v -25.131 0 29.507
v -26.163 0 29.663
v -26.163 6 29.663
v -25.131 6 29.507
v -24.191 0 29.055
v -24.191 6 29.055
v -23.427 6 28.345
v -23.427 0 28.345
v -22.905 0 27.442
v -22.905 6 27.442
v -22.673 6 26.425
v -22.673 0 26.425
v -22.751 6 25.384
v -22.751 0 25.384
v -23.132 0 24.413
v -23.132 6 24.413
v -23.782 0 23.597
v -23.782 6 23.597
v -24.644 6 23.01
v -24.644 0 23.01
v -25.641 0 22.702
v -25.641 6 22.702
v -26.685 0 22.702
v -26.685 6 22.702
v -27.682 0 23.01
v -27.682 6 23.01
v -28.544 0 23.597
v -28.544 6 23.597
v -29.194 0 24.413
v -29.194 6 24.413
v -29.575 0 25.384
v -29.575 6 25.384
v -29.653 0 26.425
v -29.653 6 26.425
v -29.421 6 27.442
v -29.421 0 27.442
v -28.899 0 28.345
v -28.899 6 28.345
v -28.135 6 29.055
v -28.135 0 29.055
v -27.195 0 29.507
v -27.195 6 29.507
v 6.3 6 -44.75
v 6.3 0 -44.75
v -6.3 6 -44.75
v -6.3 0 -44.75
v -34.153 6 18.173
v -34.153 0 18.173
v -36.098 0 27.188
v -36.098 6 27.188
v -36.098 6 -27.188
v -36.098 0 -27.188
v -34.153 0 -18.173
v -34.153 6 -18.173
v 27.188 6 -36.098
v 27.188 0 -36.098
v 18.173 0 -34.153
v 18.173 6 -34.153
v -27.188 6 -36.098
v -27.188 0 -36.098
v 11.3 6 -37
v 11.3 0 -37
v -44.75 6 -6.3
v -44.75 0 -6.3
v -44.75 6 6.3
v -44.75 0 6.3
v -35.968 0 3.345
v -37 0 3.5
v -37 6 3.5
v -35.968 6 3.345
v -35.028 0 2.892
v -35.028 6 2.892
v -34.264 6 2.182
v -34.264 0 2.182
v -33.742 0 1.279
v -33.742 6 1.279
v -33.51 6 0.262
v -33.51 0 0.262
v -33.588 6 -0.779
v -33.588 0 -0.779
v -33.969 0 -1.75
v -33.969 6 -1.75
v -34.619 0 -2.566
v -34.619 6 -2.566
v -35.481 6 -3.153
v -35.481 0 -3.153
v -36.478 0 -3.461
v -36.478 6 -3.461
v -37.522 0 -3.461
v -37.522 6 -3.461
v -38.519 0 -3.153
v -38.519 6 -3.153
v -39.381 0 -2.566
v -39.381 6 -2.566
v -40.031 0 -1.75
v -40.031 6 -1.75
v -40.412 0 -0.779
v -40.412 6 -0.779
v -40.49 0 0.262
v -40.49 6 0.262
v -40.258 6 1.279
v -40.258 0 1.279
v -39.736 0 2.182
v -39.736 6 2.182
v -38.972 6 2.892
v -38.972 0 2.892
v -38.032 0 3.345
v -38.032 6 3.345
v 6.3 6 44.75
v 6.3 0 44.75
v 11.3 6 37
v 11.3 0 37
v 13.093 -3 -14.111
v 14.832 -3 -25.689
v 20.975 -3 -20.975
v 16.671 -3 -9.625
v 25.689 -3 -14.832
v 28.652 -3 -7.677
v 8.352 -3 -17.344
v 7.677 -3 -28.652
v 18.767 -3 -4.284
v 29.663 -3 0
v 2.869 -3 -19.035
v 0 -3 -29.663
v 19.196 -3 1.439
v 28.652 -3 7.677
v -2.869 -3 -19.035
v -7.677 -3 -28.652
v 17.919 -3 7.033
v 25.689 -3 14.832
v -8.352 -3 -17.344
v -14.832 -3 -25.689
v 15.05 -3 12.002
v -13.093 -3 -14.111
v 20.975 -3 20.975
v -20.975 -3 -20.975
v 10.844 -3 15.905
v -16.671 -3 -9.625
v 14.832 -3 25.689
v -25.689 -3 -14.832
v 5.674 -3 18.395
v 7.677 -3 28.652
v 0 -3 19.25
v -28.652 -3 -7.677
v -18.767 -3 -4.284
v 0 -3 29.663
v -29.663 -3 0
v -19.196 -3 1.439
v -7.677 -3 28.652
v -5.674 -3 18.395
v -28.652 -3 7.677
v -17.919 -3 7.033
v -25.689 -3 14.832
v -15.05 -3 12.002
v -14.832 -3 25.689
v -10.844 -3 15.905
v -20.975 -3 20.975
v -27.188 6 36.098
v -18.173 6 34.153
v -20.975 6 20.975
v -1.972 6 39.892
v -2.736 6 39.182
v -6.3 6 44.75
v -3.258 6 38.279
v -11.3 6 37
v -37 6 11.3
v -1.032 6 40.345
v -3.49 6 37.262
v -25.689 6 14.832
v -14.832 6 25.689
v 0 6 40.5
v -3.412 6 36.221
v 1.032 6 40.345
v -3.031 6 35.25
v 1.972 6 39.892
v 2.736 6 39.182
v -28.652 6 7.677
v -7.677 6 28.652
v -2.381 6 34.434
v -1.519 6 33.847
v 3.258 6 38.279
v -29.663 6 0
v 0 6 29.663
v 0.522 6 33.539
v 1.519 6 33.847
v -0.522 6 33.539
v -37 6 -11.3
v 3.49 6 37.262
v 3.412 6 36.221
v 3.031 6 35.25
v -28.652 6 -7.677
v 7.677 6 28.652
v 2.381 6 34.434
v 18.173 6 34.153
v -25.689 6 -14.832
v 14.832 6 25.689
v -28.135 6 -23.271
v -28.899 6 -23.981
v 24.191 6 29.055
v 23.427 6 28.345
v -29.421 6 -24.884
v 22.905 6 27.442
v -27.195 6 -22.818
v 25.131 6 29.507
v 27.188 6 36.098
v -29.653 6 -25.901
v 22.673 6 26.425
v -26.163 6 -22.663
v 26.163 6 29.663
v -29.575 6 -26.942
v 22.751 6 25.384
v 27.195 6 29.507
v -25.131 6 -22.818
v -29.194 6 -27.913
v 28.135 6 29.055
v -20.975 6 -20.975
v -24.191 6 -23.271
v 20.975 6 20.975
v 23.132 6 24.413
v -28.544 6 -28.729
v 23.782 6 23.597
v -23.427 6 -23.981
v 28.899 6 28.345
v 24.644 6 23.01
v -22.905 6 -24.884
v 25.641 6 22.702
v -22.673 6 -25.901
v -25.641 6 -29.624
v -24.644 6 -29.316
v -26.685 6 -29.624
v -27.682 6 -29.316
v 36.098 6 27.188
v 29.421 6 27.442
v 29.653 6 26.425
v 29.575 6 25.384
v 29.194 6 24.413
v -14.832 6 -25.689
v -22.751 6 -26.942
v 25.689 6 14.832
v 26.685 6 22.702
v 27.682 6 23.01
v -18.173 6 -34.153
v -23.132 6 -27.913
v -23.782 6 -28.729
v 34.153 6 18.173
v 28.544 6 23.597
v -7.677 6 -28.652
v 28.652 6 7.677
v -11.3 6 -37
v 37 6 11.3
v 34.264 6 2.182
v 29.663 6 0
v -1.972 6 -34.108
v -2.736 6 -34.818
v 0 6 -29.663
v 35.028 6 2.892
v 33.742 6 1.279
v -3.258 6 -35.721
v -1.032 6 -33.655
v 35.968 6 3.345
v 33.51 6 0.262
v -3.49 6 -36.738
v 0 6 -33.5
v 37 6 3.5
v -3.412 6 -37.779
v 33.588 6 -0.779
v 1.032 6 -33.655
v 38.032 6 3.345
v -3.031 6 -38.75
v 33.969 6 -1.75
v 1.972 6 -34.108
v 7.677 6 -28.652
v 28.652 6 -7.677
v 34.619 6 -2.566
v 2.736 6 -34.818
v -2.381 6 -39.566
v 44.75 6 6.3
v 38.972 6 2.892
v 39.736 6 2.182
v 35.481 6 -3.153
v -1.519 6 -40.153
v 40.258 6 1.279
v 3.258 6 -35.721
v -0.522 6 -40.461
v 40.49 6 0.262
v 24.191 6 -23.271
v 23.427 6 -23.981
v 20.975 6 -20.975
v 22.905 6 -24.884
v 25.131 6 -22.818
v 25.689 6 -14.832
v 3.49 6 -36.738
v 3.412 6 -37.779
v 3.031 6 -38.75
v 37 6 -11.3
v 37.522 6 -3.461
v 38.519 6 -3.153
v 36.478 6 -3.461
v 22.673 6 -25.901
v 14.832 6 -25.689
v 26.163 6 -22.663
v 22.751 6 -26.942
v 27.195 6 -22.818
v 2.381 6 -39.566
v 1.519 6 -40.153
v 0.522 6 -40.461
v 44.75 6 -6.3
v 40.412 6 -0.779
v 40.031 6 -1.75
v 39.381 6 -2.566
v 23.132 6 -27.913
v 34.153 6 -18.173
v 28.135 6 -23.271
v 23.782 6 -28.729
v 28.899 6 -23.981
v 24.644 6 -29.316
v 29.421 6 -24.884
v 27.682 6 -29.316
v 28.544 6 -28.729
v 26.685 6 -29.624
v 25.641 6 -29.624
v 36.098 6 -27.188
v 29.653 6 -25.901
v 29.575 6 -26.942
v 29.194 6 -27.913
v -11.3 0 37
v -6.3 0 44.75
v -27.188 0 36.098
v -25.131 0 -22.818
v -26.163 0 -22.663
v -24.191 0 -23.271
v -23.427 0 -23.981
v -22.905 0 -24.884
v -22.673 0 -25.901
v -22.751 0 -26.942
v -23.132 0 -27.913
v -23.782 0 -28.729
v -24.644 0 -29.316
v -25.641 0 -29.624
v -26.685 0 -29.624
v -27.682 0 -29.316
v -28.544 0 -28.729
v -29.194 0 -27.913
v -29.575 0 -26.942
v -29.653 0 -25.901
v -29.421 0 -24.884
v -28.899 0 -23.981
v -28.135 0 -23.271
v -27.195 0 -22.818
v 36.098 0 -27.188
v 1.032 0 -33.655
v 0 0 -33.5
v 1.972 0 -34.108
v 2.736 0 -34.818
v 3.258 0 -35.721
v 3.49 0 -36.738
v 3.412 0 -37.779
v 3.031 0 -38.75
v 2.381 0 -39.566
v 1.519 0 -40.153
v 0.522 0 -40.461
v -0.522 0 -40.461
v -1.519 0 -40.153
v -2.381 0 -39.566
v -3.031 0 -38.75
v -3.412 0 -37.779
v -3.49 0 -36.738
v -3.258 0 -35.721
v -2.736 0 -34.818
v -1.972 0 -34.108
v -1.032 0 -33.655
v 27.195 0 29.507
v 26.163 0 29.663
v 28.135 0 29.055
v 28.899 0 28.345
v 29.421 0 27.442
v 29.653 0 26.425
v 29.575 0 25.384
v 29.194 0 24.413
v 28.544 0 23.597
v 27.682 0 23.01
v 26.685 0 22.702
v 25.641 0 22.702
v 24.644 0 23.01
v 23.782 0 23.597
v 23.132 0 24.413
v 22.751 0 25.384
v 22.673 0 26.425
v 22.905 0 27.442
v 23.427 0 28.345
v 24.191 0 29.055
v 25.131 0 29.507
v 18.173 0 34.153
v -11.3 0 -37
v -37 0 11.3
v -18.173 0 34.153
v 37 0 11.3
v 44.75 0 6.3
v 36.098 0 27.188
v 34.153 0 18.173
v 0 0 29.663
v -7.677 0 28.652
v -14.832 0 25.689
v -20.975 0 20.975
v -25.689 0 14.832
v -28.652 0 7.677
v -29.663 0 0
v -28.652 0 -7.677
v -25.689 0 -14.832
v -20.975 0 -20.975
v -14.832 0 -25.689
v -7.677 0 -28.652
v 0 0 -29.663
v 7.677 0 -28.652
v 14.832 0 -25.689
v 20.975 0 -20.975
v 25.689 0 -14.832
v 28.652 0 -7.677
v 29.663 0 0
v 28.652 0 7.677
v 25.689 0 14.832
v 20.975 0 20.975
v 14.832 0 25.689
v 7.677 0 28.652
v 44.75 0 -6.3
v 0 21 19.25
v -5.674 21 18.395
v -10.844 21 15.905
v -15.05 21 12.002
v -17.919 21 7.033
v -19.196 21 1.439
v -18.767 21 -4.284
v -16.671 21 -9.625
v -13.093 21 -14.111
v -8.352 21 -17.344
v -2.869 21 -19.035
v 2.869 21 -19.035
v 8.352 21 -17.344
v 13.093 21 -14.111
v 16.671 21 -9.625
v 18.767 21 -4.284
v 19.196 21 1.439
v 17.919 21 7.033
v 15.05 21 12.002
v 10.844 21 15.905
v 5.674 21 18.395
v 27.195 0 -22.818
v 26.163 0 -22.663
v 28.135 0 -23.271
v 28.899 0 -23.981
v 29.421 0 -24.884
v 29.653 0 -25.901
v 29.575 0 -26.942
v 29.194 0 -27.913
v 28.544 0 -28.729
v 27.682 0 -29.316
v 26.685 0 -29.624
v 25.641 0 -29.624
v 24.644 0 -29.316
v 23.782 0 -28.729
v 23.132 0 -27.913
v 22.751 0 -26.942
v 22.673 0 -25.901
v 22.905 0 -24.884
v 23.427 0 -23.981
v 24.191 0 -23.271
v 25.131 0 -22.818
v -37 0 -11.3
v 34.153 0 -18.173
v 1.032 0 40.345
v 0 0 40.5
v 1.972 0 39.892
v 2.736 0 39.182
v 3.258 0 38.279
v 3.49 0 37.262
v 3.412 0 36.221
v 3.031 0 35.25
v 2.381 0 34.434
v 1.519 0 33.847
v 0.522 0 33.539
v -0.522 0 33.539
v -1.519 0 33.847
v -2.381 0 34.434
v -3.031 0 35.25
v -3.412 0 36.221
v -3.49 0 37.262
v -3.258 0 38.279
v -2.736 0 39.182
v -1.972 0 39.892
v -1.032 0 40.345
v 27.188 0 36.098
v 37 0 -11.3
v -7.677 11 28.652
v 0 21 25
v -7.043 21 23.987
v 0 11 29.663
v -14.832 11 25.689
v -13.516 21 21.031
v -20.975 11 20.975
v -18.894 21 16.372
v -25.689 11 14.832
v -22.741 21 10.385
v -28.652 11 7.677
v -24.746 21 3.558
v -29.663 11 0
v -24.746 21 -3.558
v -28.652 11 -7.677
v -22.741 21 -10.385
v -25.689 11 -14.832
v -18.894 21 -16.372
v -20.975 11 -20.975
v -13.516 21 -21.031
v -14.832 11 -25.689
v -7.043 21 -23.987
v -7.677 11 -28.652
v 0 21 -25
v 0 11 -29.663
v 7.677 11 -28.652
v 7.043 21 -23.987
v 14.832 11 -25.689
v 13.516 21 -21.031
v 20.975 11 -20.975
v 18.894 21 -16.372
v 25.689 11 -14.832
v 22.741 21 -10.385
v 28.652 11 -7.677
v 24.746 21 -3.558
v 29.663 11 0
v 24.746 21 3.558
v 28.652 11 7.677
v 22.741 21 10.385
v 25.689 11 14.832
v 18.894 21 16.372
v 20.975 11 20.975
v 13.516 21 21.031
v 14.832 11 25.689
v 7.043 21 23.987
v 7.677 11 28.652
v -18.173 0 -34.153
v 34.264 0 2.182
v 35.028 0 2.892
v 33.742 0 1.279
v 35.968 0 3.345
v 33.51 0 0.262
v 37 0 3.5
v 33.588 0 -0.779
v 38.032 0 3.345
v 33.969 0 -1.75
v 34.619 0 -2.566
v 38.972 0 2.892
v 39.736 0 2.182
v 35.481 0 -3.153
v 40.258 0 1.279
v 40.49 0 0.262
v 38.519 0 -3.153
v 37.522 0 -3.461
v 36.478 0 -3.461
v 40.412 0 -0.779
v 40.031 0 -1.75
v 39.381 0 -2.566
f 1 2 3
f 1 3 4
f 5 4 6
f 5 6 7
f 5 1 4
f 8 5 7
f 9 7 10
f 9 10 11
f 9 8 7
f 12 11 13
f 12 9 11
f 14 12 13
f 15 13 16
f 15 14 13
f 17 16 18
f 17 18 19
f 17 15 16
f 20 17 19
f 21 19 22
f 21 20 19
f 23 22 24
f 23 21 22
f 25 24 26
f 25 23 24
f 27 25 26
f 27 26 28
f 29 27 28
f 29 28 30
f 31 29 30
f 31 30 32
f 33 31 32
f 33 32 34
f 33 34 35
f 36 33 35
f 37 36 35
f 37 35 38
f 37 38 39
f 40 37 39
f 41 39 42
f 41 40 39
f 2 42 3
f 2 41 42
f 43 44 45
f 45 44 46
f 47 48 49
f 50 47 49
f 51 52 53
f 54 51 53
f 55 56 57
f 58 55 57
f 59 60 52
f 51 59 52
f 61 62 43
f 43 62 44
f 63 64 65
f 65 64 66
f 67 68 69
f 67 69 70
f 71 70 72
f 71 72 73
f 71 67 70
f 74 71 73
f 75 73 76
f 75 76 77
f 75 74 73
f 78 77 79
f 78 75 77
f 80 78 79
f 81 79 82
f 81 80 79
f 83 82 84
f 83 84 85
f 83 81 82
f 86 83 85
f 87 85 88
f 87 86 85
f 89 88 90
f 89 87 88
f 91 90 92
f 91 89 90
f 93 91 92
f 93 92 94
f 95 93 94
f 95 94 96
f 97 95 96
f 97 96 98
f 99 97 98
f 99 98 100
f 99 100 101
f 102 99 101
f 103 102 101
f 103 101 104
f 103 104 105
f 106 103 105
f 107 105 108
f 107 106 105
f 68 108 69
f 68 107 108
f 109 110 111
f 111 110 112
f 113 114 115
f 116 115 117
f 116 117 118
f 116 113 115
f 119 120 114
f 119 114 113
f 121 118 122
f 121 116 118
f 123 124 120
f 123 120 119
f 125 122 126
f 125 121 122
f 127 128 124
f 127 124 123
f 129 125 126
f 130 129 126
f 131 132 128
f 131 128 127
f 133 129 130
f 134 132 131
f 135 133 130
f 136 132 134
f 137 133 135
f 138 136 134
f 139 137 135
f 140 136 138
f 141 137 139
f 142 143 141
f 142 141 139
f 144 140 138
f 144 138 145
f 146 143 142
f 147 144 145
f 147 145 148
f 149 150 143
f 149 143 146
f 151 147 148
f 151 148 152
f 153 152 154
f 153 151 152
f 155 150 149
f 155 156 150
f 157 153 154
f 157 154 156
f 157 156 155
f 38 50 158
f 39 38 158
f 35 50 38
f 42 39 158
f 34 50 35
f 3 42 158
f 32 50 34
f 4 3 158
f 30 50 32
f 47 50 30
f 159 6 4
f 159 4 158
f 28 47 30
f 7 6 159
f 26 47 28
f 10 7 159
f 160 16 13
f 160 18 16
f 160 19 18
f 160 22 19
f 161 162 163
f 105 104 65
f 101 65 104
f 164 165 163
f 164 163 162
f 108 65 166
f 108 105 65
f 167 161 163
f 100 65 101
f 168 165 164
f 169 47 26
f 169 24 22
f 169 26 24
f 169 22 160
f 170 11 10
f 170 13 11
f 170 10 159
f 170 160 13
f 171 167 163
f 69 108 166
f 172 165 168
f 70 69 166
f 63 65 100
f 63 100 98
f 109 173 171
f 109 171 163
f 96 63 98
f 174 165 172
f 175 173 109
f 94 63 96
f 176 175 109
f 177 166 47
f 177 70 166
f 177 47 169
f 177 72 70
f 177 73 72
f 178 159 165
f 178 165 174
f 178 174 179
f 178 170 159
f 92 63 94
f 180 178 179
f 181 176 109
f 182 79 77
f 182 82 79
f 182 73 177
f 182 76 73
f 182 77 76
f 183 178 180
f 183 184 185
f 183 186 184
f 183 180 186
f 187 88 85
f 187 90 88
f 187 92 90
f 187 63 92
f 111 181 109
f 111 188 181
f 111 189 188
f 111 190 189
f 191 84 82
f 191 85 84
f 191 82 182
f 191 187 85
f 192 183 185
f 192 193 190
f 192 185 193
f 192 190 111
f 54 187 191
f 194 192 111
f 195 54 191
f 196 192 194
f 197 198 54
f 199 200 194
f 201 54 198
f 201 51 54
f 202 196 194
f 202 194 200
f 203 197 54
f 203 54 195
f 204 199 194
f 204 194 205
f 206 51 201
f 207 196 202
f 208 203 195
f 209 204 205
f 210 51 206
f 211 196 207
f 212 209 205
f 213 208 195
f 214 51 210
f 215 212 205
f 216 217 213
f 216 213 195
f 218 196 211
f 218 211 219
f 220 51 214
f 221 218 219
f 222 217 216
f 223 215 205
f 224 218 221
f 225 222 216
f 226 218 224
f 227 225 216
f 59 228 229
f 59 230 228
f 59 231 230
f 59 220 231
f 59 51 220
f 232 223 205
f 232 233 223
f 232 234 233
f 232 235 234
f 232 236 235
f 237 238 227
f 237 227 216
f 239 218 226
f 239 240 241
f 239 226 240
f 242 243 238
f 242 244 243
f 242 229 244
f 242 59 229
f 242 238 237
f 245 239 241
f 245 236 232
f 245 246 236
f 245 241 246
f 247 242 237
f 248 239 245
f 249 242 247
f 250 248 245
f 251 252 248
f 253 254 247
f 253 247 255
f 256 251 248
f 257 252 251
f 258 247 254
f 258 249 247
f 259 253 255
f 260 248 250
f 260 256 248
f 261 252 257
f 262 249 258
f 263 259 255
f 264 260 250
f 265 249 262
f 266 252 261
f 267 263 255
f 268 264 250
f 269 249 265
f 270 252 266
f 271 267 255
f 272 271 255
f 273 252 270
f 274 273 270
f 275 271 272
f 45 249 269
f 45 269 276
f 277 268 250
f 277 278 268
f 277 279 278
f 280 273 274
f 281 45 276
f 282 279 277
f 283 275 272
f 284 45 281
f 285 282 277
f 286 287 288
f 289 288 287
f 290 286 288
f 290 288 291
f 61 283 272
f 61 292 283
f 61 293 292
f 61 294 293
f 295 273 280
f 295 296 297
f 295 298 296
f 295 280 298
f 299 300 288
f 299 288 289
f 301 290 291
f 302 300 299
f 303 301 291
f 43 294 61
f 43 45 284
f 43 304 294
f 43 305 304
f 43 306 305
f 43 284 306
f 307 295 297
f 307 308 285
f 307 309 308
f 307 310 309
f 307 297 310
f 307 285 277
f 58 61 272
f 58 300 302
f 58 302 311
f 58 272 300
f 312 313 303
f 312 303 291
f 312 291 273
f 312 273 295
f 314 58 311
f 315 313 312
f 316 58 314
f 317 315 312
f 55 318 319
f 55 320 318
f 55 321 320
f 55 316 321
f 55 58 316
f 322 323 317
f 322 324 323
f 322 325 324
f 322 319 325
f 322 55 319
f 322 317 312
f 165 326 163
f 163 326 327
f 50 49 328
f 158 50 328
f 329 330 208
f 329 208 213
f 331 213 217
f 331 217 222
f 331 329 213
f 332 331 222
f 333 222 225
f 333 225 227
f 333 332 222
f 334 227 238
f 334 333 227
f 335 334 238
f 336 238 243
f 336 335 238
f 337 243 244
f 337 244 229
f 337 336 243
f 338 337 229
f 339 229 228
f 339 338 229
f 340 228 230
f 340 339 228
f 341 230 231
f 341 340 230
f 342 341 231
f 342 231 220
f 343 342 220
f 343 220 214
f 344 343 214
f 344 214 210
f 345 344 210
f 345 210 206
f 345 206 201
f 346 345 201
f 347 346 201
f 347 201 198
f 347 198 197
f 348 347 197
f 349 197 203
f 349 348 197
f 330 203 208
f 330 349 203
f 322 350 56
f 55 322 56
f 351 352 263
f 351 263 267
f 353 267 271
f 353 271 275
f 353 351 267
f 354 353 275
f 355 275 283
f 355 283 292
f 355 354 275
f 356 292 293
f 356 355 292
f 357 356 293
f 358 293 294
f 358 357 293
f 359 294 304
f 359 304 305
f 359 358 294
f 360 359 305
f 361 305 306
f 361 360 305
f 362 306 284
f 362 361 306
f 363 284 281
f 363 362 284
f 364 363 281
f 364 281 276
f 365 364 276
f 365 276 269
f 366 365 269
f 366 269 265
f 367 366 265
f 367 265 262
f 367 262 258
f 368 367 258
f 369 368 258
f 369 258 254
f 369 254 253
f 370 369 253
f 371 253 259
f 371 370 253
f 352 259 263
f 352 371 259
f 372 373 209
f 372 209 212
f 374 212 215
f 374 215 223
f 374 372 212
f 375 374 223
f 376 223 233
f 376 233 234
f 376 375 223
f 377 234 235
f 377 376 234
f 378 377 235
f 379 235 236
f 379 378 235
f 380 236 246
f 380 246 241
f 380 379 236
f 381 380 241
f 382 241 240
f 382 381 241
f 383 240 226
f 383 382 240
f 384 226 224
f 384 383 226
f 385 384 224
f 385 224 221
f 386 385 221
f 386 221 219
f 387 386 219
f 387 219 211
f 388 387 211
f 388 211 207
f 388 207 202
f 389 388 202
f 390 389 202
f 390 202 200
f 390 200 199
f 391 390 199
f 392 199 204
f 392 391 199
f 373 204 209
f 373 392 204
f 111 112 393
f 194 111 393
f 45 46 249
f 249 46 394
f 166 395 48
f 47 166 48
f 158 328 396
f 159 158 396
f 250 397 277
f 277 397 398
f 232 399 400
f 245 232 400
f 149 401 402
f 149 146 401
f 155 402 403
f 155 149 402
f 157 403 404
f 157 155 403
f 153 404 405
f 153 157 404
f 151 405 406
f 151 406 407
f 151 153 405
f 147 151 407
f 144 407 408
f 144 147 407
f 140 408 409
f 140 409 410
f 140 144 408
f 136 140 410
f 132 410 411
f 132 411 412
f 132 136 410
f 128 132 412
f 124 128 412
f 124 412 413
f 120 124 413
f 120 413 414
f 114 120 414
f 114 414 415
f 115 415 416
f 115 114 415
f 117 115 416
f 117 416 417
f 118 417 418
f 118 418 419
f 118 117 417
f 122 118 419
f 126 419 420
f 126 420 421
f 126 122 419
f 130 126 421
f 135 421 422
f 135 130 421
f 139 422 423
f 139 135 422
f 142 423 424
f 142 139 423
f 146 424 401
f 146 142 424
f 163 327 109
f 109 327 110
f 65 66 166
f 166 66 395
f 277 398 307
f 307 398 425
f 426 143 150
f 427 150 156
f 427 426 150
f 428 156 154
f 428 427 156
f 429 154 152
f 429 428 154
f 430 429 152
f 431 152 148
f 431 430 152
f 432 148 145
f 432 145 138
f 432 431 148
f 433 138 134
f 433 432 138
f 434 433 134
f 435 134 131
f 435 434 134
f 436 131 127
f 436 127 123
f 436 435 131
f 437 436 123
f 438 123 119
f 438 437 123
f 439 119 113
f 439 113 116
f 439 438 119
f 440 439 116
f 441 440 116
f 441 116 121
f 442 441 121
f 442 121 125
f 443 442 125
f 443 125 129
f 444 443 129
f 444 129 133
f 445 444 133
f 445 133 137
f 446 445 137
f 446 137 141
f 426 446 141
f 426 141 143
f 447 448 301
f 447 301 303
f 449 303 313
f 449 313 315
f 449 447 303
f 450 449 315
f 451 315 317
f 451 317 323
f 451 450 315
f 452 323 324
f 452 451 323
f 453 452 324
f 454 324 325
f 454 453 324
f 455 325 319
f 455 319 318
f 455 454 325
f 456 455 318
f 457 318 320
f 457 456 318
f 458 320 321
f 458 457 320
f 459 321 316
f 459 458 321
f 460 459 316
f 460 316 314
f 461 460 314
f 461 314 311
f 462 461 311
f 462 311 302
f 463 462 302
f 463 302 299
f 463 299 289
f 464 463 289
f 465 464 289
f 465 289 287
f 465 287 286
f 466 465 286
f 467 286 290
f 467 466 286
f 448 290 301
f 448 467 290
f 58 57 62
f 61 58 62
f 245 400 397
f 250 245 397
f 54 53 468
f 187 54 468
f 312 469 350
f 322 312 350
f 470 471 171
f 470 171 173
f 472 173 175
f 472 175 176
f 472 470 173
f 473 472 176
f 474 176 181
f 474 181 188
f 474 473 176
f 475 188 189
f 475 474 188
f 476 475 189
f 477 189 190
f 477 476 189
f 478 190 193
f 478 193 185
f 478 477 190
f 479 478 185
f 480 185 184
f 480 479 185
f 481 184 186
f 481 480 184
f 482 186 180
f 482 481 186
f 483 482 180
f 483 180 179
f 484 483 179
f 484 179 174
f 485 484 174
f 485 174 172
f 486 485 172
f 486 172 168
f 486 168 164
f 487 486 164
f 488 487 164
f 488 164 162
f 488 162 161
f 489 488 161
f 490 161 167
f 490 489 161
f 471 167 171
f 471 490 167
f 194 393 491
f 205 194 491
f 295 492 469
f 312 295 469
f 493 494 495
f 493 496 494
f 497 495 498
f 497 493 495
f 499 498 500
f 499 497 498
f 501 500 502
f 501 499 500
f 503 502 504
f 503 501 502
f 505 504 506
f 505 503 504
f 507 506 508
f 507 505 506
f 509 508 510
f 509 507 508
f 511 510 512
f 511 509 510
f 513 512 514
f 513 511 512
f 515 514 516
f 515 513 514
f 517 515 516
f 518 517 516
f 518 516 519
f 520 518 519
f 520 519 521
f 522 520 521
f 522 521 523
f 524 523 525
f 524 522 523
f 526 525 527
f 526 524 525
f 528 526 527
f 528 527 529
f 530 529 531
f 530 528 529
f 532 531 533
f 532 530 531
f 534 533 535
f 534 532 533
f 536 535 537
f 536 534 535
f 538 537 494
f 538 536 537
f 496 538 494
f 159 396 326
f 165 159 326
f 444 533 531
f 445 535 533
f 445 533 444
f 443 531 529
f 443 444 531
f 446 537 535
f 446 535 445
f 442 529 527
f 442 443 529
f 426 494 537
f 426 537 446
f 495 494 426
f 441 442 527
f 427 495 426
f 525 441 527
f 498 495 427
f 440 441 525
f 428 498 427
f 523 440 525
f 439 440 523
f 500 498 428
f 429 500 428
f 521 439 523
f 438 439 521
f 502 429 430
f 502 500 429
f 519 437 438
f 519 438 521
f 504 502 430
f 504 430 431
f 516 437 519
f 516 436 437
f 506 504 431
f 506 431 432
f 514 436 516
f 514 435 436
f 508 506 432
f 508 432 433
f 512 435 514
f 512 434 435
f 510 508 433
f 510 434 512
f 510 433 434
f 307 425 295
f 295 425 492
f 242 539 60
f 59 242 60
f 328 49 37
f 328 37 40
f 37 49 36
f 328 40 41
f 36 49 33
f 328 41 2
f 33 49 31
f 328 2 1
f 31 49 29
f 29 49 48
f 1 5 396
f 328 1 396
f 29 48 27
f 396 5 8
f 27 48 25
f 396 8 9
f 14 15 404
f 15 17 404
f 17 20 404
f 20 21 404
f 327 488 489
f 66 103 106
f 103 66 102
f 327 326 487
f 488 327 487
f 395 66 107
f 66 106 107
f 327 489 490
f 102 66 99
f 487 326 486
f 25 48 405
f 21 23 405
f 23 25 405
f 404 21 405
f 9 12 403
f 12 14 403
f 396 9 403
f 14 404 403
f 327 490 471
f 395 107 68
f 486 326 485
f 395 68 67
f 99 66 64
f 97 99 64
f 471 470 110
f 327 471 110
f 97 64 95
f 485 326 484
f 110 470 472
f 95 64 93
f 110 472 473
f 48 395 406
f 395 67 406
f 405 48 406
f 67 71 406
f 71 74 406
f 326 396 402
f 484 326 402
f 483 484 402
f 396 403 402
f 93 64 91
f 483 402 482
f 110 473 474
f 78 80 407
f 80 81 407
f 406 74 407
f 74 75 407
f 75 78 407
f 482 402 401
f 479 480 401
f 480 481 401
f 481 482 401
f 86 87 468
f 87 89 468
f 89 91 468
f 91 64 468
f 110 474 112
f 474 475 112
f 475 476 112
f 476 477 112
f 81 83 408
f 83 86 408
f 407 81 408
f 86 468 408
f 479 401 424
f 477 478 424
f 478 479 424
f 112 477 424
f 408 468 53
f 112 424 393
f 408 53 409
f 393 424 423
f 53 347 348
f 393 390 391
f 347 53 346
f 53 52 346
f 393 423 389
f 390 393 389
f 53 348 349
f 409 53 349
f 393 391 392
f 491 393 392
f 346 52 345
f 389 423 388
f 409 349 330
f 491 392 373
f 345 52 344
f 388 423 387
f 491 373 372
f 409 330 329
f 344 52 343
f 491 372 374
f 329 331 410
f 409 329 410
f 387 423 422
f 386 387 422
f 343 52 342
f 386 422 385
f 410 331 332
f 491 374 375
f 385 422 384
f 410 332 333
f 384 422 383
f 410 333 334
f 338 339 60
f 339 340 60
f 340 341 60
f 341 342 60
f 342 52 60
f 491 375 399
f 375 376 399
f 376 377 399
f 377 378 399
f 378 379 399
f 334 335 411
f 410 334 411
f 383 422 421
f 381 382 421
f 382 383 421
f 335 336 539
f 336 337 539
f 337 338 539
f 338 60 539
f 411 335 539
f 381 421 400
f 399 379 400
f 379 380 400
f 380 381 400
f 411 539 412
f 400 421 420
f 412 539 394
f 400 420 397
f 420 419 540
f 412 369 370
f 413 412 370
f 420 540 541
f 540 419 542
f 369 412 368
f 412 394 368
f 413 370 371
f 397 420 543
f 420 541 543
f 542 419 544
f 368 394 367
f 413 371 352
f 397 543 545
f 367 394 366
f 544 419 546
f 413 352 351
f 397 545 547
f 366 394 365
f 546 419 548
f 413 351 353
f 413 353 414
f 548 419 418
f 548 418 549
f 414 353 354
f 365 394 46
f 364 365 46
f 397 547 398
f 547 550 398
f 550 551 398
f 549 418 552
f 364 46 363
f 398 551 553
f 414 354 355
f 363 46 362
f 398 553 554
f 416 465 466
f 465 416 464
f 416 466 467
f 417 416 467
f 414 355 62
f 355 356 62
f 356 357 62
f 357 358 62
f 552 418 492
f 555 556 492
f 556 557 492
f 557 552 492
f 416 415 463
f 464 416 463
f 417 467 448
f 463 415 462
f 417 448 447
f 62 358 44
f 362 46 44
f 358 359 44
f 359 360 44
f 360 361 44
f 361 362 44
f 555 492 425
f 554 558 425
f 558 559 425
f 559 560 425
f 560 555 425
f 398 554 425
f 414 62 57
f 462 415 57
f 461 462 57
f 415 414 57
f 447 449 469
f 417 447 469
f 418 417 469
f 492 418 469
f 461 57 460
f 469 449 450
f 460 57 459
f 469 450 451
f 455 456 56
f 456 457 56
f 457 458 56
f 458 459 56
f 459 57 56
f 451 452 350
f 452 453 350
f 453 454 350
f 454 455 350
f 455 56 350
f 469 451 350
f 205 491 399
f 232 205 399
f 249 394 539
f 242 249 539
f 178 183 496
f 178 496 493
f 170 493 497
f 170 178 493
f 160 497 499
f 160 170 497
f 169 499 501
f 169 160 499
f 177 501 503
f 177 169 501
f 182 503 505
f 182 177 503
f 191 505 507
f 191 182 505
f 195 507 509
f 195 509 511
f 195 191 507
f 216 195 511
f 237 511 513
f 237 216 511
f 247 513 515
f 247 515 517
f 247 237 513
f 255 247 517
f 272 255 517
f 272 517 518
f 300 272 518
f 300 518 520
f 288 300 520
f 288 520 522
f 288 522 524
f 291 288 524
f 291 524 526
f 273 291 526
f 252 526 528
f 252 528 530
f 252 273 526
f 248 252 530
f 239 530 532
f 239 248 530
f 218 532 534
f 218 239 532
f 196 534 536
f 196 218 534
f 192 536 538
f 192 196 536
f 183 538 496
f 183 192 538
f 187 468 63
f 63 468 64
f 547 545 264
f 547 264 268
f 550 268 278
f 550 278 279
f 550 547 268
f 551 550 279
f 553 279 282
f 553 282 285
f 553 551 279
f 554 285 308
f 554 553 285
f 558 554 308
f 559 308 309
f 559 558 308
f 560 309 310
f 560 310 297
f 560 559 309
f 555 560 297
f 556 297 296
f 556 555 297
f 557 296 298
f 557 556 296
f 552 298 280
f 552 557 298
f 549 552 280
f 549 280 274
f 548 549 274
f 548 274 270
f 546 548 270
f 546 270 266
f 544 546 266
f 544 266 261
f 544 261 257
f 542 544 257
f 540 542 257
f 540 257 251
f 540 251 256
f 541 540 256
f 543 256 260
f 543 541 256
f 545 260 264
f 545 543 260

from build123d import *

# Parameters (mm, degrees)
SKETCH2_R           = 3.5
SKETCH2_R_2         = 19.25
BOSS_EXTRUDE1_DEPTH = 6


with BuildPart() as part:
    # Sketch2 → Boss-Extrude1 (new body)
    with BuildSketch(Plane(origin=(0, 0, 0), x_dir=(1, 0, 0), z_dir=(0, 1, 0))):
        Polygon((27.188255737, 36.09780118), (18.172644276, 34.153257531), (11.3, 37), (6.3, 44.75), (-6.3, 44.75), (-11.3, 37), (-18.172644276, 34.153257531), (-27.188255737, 36.09780118), (-36.09780118, 27.188255737), (-34.153257531, 18.172644276), (-37, 11.3), (-44.75, 6.3), (-44.75, -6.3), (-37, -11.3), (-34.153257531, -18.172644276), (-36.09780118, -27.188255737), (-27.188255737, -36.09780118), (-18.172644276, -34.153257531), (-11.3, -37), (-6.3, -44.75), (6.3, -44.75), (11.3, -37), (18.172644276, -34.153257531), (27.188255737, -36.09780118), (36.09780118, -27.188255737), (34.153257531, -18.172644276), (37, -11.3), (44.75, -6.3), (44.75, 6.3), (37, 11.3), (34.153257531, 18.172644276), (36.09780118, 27.188255737), align=None)
        with Locations(Location((0, 37, 0), (0, 0, 270))):
            Circle(SKETCH2_R, mode=Mode.SUBTRACT)
        with Locations(Location((26.162950904, 26.162950904, 0), (0, 0, 270))):
            Circle(SKETCH2_R, mode=Mode.SUBTRACT)
        with Locations(Location((37, 0, 0), (0, 0, 270))):
            Circle(SKETCH2_R, mode=Mode.SUBTRACT)
        with Locations(Location((26.162950904, -26.162950904, 0), (0, 0, 270))):
            Circle(SKETCH2_R, mode=Mode.SUBTRACT)
        with Locations(Location((0, -37, 0), (0, 0, 270))):
            Circle(SKETCH2_R, mode=Mode.SUBTRACT)
        with Locations(Location((-26.162950904, -26.162950904, 0), (0, 0, 270))):
            Circle(SKETCH2_R, mode=Mode.SUBTRACT)
        with Locations(Location((-37, 0, 0), (0, 0, 270))):
            Circle(SKETCH2_R, mode=Mode.SUBTRACT)
        with Locations(Location((-26.162950904, 26.162950904, 0), (0, 0, 270))):
            Circle(SKETCH2_R, mode=Mode.SUBTRACT)
        with Locations(Location((0, 0, 0), (0, 0, 270))):
            Circle(SKETCH2_R_2, mode=Mode.SUBTRACT)
    extrude(amount=BOSS_EXTRUDE1_DEPTH)

    # Sketch3 → Revolve1 (revolve)
    with BuildSketch(Plane.XY, mode=Mode.PRIVATE) as revolve1_sk:
        Polygon((-19.25, 21), (-25, 21), (-29.663076582, 11), (-29.663076582, -3), (-19.25, -3), align=None)
    revolve(revolve1_sk.sketch.rotate(Axis((0, 33.758219329, 0), (0, -1, 0)), 270), axis=Axis((0, 33.758219329, 0), (0, -1, 0)))


solid = part.part
